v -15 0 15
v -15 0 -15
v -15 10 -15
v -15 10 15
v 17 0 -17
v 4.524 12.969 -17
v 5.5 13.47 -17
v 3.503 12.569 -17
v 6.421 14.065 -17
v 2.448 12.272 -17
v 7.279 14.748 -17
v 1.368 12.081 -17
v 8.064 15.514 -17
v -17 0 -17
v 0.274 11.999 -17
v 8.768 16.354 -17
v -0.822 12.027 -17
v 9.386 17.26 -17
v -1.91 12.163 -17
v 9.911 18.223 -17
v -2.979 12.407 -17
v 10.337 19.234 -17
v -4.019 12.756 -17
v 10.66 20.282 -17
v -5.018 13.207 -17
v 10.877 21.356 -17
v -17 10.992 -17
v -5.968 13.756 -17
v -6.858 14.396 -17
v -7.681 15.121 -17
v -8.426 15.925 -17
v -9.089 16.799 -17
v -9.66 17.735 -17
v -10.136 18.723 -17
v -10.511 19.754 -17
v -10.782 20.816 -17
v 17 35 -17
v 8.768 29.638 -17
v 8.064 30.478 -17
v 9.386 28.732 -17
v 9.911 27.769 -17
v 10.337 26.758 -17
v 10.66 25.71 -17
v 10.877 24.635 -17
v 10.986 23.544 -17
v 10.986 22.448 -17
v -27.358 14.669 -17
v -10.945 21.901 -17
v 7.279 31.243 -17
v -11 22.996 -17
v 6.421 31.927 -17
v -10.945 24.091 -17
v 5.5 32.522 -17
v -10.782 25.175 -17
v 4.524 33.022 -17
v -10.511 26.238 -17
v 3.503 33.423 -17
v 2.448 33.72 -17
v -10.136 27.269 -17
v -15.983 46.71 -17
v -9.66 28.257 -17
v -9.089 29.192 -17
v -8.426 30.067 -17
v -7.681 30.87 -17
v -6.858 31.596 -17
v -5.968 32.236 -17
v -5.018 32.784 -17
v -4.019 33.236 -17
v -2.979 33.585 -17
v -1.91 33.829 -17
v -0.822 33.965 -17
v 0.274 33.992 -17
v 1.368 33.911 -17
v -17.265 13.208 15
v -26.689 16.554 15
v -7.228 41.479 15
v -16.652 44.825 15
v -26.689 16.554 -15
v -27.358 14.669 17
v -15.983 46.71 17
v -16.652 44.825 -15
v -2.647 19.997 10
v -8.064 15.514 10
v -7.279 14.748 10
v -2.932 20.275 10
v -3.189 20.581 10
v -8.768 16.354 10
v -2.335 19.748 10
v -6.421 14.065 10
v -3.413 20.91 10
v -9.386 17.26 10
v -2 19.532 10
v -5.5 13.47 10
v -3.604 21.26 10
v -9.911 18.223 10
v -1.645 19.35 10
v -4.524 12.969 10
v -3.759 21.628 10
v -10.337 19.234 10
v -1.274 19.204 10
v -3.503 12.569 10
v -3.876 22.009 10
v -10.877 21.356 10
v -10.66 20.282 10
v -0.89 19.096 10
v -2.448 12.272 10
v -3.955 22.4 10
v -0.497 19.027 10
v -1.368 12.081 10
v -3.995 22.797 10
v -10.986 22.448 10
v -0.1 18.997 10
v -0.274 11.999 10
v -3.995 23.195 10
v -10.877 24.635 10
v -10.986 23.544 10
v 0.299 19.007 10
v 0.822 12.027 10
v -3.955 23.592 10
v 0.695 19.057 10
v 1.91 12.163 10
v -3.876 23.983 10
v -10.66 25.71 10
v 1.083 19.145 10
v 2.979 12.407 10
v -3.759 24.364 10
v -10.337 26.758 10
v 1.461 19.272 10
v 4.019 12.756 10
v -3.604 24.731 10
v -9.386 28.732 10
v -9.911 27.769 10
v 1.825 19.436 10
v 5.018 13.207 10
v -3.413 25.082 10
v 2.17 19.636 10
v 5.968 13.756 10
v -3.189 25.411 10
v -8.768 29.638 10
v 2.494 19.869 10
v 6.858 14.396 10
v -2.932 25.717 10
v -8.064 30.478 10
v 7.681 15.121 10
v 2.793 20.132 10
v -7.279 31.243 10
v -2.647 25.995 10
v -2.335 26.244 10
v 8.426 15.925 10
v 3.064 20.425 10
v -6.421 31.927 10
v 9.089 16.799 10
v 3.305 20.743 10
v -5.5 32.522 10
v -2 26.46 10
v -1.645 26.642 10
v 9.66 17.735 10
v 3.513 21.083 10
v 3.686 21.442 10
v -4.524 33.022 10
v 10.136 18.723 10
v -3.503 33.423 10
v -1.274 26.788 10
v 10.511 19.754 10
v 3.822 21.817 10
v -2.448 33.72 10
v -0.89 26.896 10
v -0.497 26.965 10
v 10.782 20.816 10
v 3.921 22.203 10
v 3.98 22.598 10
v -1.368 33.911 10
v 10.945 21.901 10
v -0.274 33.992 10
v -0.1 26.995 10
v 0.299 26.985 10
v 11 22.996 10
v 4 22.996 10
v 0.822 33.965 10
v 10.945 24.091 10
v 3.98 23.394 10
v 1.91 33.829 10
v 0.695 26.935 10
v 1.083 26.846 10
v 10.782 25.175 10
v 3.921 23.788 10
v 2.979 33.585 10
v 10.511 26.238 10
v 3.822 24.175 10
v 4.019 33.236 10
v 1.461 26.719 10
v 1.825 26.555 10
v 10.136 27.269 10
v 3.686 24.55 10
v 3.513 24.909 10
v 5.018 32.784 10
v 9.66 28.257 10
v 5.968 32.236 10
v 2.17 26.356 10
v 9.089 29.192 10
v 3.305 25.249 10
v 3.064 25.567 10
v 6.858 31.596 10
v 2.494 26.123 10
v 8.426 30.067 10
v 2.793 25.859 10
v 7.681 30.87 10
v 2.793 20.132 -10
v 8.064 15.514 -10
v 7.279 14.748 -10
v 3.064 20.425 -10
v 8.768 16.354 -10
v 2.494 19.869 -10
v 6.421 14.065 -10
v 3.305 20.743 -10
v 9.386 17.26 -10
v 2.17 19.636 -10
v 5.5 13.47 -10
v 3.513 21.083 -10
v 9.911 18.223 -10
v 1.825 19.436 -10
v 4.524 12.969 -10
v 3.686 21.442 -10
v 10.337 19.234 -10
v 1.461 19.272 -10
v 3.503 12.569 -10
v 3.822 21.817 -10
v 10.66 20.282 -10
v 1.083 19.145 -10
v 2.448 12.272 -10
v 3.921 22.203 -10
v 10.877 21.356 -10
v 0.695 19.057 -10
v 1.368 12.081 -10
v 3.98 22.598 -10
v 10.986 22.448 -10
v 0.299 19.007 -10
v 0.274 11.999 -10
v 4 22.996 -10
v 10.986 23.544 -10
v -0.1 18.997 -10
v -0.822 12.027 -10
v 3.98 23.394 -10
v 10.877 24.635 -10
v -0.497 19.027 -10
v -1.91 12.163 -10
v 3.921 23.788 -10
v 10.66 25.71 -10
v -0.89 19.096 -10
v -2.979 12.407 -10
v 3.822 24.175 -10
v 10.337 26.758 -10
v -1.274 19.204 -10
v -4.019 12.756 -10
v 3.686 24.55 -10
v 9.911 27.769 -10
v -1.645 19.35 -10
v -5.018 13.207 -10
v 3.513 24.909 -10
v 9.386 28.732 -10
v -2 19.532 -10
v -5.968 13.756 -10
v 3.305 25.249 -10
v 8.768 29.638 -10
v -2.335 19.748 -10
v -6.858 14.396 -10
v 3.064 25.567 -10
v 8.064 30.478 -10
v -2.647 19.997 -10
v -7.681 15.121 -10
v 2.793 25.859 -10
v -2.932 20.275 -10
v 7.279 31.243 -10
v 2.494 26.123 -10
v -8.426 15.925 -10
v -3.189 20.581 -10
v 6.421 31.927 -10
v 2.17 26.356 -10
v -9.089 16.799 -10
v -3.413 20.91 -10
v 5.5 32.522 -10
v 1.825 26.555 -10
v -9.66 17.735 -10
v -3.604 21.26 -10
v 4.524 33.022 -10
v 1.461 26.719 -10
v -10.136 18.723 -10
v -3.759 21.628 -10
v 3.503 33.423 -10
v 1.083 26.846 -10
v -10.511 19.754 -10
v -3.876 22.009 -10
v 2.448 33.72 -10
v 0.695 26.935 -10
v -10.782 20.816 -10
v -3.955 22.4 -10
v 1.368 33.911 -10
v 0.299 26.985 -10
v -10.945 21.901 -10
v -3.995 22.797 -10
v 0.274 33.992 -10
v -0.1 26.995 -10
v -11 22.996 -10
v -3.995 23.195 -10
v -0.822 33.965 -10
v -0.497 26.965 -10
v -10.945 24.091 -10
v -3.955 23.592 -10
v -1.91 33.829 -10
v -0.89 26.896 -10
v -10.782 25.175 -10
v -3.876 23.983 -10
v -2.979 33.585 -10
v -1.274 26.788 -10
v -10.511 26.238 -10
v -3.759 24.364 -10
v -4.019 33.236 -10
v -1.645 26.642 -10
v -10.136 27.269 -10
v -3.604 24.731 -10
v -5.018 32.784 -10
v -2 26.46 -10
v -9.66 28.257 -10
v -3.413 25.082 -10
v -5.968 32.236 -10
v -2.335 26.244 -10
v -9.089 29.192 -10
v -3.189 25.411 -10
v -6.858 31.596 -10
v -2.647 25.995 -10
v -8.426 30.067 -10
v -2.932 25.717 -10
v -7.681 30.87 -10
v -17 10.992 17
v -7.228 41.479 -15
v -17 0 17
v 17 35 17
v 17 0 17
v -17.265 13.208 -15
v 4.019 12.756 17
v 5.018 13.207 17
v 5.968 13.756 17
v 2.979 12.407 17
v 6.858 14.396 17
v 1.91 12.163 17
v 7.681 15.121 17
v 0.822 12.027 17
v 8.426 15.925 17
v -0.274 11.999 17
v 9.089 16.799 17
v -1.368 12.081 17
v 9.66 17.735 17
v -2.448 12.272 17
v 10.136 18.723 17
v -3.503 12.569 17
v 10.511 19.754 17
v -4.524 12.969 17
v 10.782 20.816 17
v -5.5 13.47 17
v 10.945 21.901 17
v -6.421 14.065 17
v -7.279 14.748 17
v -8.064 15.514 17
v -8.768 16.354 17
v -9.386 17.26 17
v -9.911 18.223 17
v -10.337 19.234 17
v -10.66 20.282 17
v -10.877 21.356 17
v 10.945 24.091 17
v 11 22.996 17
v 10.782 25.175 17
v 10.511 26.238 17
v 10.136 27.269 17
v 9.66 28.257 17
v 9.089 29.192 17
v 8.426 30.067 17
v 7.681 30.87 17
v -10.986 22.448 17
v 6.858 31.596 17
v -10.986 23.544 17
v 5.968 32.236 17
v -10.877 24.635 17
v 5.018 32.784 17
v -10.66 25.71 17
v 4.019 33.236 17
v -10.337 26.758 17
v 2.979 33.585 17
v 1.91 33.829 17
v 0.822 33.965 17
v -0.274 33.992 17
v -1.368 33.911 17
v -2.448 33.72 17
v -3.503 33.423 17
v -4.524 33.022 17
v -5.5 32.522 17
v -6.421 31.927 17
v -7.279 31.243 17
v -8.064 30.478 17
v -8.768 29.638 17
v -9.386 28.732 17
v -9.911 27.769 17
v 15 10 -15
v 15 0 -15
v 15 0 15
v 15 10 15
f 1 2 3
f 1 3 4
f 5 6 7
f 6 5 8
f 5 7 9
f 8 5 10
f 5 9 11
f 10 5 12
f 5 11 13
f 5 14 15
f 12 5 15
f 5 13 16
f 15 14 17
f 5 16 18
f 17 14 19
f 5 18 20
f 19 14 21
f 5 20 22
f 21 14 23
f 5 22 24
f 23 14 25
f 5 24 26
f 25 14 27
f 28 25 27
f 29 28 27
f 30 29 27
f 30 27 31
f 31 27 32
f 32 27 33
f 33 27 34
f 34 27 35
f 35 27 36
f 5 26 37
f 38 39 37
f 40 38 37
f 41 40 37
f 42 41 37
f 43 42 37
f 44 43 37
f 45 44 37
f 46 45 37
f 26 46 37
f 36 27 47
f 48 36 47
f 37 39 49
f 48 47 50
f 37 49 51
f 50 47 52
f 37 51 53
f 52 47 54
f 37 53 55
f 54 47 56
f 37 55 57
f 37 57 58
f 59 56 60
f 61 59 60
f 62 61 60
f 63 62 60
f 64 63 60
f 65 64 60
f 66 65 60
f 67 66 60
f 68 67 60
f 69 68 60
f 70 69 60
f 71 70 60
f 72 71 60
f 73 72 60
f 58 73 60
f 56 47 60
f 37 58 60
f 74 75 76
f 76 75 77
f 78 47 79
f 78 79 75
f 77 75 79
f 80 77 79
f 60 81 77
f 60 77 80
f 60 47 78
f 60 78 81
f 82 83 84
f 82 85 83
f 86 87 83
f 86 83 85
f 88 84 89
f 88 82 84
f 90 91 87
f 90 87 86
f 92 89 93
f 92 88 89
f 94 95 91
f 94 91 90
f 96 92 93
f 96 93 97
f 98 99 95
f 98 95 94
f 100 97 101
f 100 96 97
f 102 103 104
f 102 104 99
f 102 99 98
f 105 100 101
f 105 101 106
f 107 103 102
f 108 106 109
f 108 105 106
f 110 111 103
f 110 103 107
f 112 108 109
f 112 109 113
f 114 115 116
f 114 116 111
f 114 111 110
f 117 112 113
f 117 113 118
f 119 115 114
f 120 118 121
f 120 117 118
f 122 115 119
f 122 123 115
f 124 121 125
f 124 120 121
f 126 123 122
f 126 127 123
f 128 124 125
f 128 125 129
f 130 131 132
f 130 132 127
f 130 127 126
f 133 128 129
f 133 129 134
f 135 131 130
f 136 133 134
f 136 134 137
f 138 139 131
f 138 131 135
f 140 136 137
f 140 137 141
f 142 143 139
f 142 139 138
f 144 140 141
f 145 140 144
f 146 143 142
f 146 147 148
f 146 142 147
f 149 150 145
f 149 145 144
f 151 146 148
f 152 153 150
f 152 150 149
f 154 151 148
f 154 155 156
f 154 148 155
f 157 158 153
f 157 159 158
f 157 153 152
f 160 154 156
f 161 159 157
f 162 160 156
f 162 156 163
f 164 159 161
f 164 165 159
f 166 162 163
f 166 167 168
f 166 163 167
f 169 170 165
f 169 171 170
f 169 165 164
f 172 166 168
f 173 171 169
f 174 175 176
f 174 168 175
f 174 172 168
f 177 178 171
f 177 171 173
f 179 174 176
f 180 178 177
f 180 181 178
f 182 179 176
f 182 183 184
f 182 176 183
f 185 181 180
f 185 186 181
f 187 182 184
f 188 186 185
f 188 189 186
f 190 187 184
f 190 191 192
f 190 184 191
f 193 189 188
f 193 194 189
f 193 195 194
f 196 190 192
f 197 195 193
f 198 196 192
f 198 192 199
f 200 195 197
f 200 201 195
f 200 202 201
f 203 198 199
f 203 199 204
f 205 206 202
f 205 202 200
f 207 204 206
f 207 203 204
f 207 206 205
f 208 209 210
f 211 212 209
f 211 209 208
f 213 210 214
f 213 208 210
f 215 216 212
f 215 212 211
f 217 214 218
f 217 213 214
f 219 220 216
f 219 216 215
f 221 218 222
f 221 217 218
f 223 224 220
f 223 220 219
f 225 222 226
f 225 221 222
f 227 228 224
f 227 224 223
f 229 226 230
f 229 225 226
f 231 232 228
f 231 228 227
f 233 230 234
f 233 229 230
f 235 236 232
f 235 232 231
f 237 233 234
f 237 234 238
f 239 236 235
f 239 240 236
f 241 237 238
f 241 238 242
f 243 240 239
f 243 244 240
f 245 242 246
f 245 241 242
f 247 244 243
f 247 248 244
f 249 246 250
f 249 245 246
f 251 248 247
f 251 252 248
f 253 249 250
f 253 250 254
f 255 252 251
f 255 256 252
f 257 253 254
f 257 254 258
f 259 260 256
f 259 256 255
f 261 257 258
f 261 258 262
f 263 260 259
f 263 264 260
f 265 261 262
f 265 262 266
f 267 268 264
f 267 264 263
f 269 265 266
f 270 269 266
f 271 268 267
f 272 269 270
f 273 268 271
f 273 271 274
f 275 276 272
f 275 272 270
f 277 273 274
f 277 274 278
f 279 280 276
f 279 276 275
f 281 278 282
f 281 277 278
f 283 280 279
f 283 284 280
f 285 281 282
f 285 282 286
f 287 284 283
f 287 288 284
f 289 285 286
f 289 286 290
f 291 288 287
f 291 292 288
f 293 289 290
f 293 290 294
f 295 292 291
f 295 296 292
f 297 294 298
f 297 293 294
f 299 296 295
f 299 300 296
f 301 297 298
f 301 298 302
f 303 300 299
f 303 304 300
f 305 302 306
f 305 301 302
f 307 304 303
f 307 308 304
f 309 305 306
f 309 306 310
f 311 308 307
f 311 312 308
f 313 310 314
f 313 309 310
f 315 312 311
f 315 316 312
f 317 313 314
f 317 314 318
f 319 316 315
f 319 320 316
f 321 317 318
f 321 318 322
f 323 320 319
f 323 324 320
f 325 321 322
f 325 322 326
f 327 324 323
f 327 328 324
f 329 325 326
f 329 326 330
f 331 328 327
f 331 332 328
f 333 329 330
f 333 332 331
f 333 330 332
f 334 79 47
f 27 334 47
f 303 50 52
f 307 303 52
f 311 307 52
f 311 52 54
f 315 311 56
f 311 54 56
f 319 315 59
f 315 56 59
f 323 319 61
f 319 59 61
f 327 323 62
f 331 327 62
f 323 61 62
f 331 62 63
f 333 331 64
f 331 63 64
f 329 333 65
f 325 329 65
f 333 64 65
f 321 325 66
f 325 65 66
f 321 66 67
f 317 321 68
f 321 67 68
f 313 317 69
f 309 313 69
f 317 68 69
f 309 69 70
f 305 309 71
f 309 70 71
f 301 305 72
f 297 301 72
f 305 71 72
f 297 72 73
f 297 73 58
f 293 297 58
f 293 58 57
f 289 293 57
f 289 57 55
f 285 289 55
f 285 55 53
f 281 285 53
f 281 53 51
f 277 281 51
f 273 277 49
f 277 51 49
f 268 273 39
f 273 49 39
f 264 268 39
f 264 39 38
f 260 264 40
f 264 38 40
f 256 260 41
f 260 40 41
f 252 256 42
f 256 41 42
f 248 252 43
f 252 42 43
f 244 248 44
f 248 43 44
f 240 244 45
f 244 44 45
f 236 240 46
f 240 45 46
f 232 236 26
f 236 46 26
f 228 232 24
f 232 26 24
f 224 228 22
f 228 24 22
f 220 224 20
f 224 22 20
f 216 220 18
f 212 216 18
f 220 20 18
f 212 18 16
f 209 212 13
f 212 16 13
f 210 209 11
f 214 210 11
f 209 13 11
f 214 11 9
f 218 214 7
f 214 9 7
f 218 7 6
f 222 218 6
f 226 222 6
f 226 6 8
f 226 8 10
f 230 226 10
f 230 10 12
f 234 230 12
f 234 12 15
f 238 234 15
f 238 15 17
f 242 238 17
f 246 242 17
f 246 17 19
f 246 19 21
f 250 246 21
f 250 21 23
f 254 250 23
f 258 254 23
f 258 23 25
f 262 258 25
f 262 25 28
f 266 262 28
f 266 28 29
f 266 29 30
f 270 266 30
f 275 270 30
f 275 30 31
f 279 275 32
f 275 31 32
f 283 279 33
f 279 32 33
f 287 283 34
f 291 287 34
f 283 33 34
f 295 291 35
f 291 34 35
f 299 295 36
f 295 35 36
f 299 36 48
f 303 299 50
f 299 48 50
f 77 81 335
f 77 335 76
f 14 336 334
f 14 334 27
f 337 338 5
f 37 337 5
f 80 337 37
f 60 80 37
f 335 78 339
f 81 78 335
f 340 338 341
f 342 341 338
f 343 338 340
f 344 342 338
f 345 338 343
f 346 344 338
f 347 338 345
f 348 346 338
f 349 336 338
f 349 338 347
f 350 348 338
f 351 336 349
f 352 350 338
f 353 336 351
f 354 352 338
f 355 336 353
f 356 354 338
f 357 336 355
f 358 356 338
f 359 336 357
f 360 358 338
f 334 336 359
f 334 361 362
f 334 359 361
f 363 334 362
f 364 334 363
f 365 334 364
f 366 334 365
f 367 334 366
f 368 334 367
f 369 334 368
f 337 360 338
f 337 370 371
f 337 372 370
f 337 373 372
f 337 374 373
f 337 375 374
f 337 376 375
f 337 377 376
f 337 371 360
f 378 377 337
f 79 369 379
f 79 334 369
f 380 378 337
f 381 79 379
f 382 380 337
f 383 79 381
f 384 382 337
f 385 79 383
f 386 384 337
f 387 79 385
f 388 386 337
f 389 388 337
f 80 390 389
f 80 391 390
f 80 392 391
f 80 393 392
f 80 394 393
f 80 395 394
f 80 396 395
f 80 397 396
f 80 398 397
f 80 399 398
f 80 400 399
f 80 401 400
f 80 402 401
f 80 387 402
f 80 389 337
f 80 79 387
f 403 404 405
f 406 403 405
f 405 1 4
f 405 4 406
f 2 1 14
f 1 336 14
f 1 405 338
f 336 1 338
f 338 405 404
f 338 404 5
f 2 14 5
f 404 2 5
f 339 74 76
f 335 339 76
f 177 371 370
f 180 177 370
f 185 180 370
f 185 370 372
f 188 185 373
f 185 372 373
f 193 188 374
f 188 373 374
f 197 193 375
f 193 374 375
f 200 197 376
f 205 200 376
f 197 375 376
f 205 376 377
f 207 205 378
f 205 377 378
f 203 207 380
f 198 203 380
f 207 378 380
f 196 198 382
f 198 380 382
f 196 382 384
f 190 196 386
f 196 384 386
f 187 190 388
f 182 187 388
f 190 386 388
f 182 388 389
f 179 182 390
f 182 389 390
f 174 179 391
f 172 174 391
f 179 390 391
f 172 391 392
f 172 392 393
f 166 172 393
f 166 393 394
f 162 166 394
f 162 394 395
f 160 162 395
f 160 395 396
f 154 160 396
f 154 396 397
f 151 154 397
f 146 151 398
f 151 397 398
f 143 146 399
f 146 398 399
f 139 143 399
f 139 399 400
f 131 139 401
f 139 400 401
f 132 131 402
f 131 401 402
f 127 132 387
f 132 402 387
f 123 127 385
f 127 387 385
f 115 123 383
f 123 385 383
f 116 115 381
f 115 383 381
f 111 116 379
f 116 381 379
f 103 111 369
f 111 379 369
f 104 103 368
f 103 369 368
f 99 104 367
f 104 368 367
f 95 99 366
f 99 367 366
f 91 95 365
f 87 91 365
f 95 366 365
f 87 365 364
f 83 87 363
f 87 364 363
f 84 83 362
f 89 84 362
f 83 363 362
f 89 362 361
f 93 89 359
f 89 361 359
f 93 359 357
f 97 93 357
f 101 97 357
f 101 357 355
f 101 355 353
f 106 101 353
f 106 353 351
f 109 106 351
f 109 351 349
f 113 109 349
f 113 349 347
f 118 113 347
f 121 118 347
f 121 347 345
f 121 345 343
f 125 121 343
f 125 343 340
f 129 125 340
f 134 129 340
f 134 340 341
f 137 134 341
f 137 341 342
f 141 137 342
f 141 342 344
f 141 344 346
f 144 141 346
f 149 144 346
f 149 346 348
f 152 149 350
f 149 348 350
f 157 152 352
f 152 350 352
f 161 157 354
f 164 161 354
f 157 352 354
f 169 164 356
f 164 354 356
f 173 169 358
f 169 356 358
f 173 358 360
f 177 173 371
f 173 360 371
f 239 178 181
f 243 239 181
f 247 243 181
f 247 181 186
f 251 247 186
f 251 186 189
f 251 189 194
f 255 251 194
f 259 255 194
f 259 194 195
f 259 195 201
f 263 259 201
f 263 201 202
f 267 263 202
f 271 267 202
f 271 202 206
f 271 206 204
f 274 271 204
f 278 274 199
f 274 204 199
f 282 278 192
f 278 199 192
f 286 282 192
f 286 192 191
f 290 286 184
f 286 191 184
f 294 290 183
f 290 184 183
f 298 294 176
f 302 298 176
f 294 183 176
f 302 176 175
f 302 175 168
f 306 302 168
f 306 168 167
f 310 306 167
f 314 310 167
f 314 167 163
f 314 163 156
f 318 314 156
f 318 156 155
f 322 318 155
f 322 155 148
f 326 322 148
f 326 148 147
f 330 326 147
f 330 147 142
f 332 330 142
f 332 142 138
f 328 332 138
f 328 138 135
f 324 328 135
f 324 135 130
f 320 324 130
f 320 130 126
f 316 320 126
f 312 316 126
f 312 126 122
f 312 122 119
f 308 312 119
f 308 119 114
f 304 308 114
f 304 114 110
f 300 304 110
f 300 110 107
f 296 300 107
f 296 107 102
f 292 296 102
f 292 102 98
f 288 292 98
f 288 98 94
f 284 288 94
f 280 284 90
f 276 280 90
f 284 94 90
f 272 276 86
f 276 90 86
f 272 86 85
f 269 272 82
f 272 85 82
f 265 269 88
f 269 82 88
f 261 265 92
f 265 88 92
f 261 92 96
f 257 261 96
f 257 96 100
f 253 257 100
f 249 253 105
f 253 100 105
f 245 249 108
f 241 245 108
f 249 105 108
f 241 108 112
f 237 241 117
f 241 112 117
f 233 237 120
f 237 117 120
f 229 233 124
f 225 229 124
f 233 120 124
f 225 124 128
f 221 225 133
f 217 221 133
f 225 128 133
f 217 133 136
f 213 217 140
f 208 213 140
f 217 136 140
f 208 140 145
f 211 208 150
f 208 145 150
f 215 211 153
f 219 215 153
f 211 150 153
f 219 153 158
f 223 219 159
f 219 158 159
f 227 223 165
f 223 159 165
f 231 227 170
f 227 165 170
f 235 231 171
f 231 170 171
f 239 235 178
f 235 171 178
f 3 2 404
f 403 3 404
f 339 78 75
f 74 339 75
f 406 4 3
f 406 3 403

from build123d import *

# Parameters (mm, degrees)
SKETCH2_W           = 34
SKETCH2_H           = 34
BOSS_EXTRUDE2_DEPTH = 35
CUT_EXTRUDE6_DEPTH  = 35
SKETCH17_W          = 30
SKETCH17_H          = 30
CUT_EXTRUDE7_DEPTH  = 10
SKETCH18_W          = 30
SKETCH18_H          = 10
CUT_EXTRUDE8_DEPTH  = 30
SKETCH19_R          = 11
CUT_EXTRUDE10_DEPTH = 7
SKETCH20_R          = 11
CUT_EXTRUDE11_DEPTH = 7
SKETCH22_R          = 4
CUT_EXTRUDE12_DEPTH = 30


with BuildPart() as part:
    # Sketch2 → Boss-Extrude2 (new body)
    with BuildSketch(Plane(origin=(0, 0, 0), x_dir=(1, 0, 0), z_dir=(0, 1, 0))):
        Rectangle(SKETCH2_W, SKETCH2_H)
    boss_extrude2 = extrude(amount=BOSS_EXTRUDE2_DEPTH)

    # Sketch16 → Cut-Extrude6 (cut)
    with BuildSketch(Plane.XY.offset(17)):
        Polygon((-17, 35), (-17, 10.991783965), (17, 35), align=None)
    extrude(amount=-CUT_EXTRUDE6_DEPTH, mode=Mode.SUBTRACT)

    # Sketch17 → Cut-Extrude7 (cut)
    with BuildSketch(Plane.XZ):
        Rectangle(SKETCH17_W, SKETCH17_H)
    cut_extrude7 = extrude(amount=-CUT_EXTRUDE7_DEPTH, mode=Mode.SUBTRACT)

    # Mirror6: Boss-Extrude2, Cut-Extrude7 across plane
    add(boss_extrude2.mirror(Plane(origin=(17, 35, -18), x_dir=(0, 0, 1), z_dir=(0.57681494, -0.816874853, 0))))
    add(cut_extrude7.mirror(Plane(origin=(17, 35, -18), x_dir=(0, 0, 1), z_dir=(0.57681494, -0.816874853, 0))), mode=Mode.SUBTRACT)

    # Sketch18 → Cut-Extrude8 (cut)
    with BuildSketch(Plane.ZY.offset(-15)):
        with Locations((0, 5)):
            Rectangle(SKETCH18_W, SKETCH18_H)
    extrude(amount=CUT_EXTRUDE8_DEPTH, mode=Mode.SUBTRACT)

    # Sketch19 → Cut-Extrude10 (cut)
    with BuildSketch(Plane(origin=(0, 0, -17), x_dir=(-1, 0, 0), z_dir=(0, 0, -1))):
        with Locations((0, 22.995891982)):
            Circle(SKETCH19_R)
    extrude(amount=-CUT_EXTRUDE10_DEPTH, mode=Mode.SUBTRACT)

    # Sketch20 → Cut-Extrude11 (cut)
    with BuildSketch(Plane.XY.offset(17)):
        with Locations((0, 22.995891982)):
            Circle(SKETCH20_R)
    extrude(amount=-CUT_EXTRUDE11_DEPTH, mode=Mode.SUBTRACT)

    # Sketch22 → Cut-Extrude12 (cut)
    with BuildSketch(Plane.XY.offset(10)):
        with Locations((0, 22.995891982)):
            Circle(SKETCH22_R)
    extrude(amount=-CUT_EXTRUDE12_DEPTH, mode=Mode.SUBTRACT)


solid = part.part
